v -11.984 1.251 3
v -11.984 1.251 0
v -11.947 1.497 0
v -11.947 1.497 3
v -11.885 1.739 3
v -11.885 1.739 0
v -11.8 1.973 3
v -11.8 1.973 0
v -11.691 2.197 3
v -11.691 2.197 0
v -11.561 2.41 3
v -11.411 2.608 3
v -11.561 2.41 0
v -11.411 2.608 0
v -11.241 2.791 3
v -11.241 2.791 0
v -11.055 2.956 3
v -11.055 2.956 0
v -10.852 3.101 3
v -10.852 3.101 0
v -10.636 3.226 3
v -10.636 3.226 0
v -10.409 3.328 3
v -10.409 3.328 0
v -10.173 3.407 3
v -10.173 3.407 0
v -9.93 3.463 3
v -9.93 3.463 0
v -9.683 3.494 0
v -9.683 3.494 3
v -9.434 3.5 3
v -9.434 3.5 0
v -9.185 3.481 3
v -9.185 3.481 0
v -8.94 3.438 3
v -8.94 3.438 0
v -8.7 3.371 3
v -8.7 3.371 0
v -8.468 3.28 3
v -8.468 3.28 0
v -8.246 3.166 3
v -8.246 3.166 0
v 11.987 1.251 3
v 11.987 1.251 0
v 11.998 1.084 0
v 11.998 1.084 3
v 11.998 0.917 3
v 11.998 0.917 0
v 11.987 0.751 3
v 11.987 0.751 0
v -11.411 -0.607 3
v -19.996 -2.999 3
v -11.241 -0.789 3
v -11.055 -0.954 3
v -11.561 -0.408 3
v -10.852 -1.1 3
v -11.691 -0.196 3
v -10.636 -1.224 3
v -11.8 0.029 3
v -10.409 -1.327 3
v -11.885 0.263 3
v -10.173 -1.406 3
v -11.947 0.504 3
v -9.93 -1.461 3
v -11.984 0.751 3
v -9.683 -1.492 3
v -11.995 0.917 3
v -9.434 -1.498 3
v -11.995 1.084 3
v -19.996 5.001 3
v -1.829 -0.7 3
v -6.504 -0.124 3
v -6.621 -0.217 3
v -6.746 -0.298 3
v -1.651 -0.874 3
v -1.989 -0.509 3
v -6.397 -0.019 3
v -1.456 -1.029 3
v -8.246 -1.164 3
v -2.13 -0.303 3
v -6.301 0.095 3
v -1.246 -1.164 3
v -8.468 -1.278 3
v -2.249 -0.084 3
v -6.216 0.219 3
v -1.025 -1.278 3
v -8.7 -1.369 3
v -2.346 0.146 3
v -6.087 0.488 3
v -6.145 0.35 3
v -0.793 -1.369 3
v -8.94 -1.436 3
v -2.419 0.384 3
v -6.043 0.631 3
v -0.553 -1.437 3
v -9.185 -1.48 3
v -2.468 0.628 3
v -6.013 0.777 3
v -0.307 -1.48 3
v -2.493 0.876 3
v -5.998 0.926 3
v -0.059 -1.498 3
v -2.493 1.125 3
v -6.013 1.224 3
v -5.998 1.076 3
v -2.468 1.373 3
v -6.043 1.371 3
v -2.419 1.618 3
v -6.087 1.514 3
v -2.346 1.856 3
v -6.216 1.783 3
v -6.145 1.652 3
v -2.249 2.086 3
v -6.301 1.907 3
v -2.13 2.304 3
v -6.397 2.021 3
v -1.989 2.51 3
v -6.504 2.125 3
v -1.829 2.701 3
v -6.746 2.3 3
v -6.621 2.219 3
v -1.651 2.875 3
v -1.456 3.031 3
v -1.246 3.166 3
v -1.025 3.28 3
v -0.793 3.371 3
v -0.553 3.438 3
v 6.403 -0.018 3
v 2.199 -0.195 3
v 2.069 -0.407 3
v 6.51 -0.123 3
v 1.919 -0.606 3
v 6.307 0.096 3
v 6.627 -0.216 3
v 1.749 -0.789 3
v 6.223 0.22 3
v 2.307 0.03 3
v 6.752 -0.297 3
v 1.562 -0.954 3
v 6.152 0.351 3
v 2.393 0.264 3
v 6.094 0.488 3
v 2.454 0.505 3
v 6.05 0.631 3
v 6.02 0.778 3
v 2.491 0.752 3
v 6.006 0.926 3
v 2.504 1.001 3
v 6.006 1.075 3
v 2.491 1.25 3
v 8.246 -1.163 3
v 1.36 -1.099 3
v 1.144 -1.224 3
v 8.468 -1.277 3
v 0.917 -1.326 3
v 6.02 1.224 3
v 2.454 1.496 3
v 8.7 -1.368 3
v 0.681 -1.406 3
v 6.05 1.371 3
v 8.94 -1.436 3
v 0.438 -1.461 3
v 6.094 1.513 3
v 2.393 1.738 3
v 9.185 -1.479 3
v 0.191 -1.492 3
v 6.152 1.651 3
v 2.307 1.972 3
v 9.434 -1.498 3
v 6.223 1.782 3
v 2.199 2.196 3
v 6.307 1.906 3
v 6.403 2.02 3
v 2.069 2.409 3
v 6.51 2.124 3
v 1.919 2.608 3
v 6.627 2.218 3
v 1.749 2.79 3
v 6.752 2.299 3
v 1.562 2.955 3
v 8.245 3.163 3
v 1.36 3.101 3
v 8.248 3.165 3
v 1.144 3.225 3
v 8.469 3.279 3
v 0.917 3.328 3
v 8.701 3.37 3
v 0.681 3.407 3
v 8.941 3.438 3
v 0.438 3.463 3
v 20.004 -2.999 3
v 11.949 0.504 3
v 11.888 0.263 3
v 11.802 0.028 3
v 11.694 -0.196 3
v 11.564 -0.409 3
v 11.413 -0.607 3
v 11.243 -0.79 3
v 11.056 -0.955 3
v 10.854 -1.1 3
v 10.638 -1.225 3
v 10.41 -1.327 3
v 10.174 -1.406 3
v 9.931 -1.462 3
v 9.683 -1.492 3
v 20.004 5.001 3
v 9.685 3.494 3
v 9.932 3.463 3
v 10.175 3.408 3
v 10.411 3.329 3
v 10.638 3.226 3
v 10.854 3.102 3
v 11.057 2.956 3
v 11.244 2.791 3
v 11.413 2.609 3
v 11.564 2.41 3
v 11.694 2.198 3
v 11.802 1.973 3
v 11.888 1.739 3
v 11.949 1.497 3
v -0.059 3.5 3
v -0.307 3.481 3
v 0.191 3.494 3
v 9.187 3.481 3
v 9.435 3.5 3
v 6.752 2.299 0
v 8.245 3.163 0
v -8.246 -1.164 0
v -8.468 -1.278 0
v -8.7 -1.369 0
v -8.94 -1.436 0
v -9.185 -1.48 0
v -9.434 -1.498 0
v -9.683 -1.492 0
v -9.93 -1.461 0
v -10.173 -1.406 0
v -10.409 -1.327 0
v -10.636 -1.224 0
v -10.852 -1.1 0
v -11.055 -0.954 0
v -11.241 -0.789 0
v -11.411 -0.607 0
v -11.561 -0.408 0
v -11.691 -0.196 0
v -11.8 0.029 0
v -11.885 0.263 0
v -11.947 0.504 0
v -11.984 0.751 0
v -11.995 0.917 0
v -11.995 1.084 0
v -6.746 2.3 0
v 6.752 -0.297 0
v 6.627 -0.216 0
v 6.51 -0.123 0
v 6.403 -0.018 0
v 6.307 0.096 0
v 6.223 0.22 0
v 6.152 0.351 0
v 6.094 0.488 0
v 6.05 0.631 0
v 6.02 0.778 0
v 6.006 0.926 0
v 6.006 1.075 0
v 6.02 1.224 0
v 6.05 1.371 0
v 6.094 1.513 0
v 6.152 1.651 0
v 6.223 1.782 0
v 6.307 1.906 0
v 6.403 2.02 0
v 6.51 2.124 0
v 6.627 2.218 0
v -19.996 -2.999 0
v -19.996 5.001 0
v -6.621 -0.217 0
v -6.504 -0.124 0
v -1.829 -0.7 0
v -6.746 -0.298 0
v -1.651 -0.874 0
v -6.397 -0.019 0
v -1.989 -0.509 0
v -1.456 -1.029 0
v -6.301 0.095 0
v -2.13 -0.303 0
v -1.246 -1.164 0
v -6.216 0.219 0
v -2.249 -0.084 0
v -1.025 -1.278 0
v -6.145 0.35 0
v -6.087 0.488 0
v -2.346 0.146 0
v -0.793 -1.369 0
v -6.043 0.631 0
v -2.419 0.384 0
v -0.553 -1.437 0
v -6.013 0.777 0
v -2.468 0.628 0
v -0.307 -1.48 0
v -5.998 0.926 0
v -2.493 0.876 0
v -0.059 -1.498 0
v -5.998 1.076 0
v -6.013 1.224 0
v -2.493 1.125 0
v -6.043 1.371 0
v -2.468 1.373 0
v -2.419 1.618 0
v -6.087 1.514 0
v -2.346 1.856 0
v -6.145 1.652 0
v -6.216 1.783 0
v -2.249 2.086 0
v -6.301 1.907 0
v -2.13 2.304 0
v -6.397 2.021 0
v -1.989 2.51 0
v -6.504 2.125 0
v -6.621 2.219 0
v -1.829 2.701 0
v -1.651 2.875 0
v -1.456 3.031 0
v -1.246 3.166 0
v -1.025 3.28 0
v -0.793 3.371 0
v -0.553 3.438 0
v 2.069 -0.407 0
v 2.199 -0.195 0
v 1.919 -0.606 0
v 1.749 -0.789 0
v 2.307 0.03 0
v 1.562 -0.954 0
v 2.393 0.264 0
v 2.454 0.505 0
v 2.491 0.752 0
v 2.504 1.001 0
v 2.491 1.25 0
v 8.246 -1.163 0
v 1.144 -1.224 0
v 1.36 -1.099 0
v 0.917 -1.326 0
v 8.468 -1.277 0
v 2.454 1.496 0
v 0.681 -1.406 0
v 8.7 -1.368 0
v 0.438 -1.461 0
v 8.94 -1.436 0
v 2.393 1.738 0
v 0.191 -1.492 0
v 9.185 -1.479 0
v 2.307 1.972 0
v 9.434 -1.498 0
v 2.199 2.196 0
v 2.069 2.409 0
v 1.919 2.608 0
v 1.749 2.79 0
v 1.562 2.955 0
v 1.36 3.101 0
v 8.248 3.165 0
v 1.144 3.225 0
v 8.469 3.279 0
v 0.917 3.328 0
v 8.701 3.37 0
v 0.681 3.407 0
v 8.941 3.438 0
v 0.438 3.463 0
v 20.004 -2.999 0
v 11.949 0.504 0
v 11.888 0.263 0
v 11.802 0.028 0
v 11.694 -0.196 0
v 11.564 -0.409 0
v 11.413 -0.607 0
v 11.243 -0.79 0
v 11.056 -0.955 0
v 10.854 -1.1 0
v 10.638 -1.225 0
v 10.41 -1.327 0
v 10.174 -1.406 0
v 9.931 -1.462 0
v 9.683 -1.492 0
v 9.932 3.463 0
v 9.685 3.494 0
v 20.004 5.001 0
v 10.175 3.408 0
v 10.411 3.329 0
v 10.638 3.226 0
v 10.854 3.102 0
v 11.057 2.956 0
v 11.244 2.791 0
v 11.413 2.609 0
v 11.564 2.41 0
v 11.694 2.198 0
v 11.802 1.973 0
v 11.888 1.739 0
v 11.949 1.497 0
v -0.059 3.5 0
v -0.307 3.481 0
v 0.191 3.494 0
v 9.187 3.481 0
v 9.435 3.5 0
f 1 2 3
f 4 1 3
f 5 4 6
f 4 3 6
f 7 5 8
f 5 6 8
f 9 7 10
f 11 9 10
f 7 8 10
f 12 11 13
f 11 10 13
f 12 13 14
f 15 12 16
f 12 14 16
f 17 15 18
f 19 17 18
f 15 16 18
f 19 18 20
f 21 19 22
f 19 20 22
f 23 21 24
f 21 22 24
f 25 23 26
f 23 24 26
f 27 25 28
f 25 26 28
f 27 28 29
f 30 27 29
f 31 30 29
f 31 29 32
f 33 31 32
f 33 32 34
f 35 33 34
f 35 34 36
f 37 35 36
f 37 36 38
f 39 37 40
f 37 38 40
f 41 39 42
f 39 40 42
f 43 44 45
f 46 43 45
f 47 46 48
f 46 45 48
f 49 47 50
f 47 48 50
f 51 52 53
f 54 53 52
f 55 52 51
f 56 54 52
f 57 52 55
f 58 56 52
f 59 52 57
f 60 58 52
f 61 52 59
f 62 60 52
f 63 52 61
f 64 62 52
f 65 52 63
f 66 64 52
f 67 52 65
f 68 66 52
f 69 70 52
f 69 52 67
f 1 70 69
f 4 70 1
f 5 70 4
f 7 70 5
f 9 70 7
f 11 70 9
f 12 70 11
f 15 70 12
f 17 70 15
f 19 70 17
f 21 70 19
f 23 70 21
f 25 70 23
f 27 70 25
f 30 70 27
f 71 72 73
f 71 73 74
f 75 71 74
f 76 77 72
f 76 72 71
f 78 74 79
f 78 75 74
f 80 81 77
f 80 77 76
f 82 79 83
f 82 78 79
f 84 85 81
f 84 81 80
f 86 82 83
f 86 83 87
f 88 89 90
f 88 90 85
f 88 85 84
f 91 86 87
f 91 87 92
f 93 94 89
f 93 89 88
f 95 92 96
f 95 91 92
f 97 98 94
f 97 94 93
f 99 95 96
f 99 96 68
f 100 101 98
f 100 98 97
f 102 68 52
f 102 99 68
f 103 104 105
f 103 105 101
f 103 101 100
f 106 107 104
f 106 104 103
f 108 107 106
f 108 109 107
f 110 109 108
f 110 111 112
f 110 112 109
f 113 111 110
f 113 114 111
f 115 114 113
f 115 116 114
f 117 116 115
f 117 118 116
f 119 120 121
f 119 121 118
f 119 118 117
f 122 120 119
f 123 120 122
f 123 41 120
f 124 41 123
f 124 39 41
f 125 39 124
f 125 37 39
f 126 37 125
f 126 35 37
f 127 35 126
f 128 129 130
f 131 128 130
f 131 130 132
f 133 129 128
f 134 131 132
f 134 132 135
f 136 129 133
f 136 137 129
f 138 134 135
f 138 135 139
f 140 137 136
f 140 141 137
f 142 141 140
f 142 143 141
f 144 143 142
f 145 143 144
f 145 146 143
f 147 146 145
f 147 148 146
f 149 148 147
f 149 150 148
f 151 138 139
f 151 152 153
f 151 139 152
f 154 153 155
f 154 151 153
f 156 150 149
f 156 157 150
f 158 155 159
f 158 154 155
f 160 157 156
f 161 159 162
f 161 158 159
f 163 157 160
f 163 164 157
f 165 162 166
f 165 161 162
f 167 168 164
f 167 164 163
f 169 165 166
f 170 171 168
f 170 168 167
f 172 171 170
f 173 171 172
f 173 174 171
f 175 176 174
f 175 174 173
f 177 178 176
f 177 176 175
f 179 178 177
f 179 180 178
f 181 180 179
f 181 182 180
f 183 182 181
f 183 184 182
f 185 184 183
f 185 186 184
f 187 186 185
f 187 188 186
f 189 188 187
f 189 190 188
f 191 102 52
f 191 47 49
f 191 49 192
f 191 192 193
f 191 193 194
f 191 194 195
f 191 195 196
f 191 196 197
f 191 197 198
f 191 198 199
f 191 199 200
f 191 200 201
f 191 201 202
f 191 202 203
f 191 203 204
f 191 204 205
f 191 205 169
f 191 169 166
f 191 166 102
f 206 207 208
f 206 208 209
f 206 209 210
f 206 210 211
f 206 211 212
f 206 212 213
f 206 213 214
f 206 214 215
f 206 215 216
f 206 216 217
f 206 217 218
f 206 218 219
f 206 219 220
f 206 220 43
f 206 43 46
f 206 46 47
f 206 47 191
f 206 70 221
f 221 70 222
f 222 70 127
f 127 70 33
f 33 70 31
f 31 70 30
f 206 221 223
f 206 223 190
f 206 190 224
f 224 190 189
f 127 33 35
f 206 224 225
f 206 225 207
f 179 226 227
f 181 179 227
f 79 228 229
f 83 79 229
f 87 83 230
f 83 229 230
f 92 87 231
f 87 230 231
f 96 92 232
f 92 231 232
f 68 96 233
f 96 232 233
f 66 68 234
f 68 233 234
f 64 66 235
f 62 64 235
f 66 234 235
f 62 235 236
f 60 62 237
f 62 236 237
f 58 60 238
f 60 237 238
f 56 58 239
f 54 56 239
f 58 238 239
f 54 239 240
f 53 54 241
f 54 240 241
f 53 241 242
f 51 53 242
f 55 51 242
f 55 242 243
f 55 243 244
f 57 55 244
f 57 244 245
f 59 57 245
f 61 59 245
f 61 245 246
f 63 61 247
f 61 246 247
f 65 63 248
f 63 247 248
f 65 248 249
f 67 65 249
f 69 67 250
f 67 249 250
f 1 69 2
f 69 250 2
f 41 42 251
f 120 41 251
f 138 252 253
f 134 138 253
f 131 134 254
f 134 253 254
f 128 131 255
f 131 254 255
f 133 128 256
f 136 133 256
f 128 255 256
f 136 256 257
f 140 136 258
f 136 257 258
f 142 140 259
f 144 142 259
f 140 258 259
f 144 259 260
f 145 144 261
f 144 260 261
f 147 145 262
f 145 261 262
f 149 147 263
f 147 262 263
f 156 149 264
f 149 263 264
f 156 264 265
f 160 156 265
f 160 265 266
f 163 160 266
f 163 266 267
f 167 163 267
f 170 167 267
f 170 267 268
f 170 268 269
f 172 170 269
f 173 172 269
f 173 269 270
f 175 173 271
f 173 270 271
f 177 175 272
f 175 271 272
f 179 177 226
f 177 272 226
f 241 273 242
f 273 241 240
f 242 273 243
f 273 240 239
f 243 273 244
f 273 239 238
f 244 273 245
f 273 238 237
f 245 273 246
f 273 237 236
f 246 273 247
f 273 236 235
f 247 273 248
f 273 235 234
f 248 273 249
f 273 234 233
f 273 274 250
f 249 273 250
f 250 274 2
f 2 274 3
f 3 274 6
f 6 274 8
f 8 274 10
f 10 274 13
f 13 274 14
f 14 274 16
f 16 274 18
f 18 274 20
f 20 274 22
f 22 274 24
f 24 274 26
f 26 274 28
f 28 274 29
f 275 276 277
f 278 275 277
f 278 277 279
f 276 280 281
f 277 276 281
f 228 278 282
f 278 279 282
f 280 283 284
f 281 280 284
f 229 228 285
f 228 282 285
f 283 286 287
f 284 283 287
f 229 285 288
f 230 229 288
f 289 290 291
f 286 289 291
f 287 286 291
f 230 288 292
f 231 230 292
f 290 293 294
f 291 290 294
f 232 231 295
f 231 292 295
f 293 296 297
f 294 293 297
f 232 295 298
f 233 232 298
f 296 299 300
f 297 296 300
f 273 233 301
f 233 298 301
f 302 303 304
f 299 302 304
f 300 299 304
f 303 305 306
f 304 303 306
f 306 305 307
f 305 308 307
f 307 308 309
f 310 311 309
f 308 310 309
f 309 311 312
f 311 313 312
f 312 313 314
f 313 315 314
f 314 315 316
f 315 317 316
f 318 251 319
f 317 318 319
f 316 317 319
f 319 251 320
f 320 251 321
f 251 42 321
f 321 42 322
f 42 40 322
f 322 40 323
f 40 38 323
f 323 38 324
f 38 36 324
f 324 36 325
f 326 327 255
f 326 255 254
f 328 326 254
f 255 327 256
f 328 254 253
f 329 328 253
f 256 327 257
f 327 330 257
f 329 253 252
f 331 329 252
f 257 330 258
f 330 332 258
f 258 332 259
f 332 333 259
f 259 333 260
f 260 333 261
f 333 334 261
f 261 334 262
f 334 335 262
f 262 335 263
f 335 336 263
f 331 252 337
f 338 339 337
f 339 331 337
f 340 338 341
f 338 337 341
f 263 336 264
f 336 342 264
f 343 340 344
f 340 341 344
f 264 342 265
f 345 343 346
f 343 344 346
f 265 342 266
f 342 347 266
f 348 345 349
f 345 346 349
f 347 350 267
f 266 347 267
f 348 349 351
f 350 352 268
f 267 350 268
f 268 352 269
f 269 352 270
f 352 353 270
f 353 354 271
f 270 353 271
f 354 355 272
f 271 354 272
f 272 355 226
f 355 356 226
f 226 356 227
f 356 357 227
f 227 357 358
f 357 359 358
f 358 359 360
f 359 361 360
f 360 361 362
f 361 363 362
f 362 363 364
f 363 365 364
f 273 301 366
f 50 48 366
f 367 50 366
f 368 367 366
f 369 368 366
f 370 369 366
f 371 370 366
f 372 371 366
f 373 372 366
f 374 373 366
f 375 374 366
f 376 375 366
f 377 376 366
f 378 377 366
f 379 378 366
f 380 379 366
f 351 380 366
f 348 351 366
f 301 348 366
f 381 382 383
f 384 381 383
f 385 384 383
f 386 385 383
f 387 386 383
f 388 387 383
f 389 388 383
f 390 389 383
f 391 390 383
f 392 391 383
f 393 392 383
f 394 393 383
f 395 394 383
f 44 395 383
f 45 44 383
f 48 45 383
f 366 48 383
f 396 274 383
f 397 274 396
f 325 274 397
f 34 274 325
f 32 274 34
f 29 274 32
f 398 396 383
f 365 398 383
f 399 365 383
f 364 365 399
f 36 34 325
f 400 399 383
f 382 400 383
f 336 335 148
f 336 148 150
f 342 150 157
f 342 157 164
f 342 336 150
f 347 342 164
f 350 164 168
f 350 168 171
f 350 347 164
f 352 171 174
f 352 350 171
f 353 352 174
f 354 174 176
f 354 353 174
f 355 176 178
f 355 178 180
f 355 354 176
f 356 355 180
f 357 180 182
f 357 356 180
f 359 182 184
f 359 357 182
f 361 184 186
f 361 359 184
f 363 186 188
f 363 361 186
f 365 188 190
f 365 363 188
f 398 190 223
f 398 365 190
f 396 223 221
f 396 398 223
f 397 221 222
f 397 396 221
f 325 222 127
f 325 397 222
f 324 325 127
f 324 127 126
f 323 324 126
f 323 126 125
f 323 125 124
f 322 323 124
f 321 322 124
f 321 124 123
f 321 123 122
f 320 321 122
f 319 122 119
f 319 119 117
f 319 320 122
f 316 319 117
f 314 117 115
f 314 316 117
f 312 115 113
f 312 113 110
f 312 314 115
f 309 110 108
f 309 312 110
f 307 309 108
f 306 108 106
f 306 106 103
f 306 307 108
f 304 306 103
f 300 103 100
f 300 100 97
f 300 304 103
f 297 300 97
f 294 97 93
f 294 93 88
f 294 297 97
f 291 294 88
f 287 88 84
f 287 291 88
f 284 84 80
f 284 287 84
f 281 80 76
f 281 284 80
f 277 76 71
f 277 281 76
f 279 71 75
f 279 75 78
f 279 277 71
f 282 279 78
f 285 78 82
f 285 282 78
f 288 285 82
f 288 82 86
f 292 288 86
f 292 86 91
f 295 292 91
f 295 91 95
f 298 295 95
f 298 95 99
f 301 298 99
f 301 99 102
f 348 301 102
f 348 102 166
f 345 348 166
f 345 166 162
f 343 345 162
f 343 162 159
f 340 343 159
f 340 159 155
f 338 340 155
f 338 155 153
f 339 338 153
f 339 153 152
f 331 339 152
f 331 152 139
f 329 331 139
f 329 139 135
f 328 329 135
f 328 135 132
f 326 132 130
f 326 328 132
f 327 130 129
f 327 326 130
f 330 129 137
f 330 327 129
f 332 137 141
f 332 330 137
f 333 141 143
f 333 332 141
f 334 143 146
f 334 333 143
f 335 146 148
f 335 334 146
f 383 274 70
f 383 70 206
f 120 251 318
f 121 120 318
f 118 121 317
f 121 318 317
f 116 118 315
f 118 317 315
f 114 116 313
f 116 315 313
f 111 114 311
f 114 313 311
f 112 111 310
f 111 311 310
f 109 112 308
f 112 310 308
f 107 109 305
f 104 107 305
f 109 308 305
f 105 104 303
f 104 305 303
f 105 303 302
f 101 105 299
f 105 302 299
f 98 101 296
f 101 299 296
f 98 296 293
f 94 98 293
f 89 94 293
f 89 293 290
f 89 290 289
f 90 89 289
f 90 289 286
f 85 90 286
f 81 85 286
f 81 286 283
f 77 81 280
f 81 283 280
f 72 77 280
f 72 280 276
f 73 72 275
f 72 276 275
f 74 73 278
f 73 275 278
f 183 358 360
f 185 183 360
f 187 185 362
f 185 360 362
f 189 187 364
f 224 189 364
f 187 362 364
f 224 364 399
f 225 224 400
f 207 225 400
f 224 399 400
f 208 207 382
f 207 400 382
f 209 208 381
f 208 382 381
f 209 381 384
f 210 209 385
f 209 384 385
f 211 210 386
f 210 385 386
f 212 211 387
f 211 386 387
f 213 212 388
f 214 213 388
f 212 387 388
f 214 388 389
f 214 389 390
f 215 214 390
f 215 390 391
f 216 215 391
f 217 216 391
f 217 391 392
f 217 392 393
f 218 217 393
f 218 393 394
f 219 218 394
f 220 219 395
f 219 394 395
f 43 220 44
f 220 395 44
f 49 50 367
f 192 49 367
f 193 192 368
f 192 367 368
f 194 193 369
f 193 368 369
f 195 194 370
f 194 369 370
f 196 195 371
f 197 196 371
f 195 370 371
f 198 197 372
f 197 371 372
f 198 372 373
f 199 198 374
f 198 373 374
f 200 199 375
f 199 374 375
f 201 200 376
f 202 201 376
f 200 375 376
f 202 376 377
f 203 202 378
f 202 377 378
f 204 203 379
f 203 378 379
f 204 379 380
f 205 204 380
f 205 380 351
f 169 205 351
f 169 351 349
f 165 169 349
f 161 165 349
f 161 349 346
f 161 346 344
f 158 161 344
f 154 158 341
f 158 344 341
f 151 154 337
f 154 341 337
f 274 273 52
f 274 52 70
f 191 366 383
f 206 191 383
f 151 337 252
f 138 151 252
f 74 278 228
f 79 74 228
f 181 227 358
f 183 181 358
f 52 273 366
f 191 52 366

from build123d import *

# Parameters (mm, degrees)
SKETCH1_W           = 40
SKETCH1_H           = 8
SKETCH1_R           = 2.5
BOSS_EXTRUDE1_DEPTH = 3


with BuildPart() as part:
    # Sketch1 → Boss-Extrude1 (new body)
    with BuildSketch(Plane.XY):
        with Locations((0.003679189, 1.000819415)):
            Rectangle(SKETCH1_W, SKETCH1_H)
        with BuildLine():
            Line((-8.246320143, 3.165882539), (-6.746321478, 2.29985729))
            ThreePointArc((-6.746321478, 2.29985729), (-5.996321879, 1.000819415), (-6.746321478, -0.298218459))
            Line((-6.746321478, -0.298218459), (-8.246320143, -1.164243709))
            ThreePointArc((-8.246320143, -1.164243709), (-10.636363972, -1.224107908), (-11.983789404, 0.750819415))
            ThreePointArc((-11.983789404, 0.750819415), (-11.996320811, 1.000819415), (-11.983789404, 1.250819415))
            ThreePointArc((-11.983789404, 1.250819415), (-10.636363972, 3.225746738), (-8.246320143, 3.165882539))
        make_face(mode=Mode.SUBTRACT)
        with Locations((0.003679189, 1.000819415)):
            Circle(SKETCH1_R, mode=Mode.SUBTRACT)
        with BuildLine():
            Line((8.244905291, 3.163423753), (8.247736867, 3.165063509))
            ThreePointArc((8.247736867, 3.165063509), (10.638467861, 3.226118523), (11.986620451, 1.250819308))
            ThreePointArc((11.986620451, 1.250819308), (11.999151848, 1.000819415), (11.986620451, 0.750819522))
            ThreePointArc((11.986620451, 0.750819522), (10.637740693, -1.224851841), (8.246322819, -1.162606427))
            Line((8.246322819, -1.162606427), (6.751978531, -0.297235948))
            ThreePointArc((6.751978531, -0.297235948), (6.003678121, 1.000819415), (6.751978531, 2.298874779))
            Line((6.751978531, 2.298874779), (8.244905291, 3.163423753))
        make_face(mode=Mode.SUBTRACT)
    extrude(amount=BOSS_EXTRUDE1_DEPTH)


solid = part.part
